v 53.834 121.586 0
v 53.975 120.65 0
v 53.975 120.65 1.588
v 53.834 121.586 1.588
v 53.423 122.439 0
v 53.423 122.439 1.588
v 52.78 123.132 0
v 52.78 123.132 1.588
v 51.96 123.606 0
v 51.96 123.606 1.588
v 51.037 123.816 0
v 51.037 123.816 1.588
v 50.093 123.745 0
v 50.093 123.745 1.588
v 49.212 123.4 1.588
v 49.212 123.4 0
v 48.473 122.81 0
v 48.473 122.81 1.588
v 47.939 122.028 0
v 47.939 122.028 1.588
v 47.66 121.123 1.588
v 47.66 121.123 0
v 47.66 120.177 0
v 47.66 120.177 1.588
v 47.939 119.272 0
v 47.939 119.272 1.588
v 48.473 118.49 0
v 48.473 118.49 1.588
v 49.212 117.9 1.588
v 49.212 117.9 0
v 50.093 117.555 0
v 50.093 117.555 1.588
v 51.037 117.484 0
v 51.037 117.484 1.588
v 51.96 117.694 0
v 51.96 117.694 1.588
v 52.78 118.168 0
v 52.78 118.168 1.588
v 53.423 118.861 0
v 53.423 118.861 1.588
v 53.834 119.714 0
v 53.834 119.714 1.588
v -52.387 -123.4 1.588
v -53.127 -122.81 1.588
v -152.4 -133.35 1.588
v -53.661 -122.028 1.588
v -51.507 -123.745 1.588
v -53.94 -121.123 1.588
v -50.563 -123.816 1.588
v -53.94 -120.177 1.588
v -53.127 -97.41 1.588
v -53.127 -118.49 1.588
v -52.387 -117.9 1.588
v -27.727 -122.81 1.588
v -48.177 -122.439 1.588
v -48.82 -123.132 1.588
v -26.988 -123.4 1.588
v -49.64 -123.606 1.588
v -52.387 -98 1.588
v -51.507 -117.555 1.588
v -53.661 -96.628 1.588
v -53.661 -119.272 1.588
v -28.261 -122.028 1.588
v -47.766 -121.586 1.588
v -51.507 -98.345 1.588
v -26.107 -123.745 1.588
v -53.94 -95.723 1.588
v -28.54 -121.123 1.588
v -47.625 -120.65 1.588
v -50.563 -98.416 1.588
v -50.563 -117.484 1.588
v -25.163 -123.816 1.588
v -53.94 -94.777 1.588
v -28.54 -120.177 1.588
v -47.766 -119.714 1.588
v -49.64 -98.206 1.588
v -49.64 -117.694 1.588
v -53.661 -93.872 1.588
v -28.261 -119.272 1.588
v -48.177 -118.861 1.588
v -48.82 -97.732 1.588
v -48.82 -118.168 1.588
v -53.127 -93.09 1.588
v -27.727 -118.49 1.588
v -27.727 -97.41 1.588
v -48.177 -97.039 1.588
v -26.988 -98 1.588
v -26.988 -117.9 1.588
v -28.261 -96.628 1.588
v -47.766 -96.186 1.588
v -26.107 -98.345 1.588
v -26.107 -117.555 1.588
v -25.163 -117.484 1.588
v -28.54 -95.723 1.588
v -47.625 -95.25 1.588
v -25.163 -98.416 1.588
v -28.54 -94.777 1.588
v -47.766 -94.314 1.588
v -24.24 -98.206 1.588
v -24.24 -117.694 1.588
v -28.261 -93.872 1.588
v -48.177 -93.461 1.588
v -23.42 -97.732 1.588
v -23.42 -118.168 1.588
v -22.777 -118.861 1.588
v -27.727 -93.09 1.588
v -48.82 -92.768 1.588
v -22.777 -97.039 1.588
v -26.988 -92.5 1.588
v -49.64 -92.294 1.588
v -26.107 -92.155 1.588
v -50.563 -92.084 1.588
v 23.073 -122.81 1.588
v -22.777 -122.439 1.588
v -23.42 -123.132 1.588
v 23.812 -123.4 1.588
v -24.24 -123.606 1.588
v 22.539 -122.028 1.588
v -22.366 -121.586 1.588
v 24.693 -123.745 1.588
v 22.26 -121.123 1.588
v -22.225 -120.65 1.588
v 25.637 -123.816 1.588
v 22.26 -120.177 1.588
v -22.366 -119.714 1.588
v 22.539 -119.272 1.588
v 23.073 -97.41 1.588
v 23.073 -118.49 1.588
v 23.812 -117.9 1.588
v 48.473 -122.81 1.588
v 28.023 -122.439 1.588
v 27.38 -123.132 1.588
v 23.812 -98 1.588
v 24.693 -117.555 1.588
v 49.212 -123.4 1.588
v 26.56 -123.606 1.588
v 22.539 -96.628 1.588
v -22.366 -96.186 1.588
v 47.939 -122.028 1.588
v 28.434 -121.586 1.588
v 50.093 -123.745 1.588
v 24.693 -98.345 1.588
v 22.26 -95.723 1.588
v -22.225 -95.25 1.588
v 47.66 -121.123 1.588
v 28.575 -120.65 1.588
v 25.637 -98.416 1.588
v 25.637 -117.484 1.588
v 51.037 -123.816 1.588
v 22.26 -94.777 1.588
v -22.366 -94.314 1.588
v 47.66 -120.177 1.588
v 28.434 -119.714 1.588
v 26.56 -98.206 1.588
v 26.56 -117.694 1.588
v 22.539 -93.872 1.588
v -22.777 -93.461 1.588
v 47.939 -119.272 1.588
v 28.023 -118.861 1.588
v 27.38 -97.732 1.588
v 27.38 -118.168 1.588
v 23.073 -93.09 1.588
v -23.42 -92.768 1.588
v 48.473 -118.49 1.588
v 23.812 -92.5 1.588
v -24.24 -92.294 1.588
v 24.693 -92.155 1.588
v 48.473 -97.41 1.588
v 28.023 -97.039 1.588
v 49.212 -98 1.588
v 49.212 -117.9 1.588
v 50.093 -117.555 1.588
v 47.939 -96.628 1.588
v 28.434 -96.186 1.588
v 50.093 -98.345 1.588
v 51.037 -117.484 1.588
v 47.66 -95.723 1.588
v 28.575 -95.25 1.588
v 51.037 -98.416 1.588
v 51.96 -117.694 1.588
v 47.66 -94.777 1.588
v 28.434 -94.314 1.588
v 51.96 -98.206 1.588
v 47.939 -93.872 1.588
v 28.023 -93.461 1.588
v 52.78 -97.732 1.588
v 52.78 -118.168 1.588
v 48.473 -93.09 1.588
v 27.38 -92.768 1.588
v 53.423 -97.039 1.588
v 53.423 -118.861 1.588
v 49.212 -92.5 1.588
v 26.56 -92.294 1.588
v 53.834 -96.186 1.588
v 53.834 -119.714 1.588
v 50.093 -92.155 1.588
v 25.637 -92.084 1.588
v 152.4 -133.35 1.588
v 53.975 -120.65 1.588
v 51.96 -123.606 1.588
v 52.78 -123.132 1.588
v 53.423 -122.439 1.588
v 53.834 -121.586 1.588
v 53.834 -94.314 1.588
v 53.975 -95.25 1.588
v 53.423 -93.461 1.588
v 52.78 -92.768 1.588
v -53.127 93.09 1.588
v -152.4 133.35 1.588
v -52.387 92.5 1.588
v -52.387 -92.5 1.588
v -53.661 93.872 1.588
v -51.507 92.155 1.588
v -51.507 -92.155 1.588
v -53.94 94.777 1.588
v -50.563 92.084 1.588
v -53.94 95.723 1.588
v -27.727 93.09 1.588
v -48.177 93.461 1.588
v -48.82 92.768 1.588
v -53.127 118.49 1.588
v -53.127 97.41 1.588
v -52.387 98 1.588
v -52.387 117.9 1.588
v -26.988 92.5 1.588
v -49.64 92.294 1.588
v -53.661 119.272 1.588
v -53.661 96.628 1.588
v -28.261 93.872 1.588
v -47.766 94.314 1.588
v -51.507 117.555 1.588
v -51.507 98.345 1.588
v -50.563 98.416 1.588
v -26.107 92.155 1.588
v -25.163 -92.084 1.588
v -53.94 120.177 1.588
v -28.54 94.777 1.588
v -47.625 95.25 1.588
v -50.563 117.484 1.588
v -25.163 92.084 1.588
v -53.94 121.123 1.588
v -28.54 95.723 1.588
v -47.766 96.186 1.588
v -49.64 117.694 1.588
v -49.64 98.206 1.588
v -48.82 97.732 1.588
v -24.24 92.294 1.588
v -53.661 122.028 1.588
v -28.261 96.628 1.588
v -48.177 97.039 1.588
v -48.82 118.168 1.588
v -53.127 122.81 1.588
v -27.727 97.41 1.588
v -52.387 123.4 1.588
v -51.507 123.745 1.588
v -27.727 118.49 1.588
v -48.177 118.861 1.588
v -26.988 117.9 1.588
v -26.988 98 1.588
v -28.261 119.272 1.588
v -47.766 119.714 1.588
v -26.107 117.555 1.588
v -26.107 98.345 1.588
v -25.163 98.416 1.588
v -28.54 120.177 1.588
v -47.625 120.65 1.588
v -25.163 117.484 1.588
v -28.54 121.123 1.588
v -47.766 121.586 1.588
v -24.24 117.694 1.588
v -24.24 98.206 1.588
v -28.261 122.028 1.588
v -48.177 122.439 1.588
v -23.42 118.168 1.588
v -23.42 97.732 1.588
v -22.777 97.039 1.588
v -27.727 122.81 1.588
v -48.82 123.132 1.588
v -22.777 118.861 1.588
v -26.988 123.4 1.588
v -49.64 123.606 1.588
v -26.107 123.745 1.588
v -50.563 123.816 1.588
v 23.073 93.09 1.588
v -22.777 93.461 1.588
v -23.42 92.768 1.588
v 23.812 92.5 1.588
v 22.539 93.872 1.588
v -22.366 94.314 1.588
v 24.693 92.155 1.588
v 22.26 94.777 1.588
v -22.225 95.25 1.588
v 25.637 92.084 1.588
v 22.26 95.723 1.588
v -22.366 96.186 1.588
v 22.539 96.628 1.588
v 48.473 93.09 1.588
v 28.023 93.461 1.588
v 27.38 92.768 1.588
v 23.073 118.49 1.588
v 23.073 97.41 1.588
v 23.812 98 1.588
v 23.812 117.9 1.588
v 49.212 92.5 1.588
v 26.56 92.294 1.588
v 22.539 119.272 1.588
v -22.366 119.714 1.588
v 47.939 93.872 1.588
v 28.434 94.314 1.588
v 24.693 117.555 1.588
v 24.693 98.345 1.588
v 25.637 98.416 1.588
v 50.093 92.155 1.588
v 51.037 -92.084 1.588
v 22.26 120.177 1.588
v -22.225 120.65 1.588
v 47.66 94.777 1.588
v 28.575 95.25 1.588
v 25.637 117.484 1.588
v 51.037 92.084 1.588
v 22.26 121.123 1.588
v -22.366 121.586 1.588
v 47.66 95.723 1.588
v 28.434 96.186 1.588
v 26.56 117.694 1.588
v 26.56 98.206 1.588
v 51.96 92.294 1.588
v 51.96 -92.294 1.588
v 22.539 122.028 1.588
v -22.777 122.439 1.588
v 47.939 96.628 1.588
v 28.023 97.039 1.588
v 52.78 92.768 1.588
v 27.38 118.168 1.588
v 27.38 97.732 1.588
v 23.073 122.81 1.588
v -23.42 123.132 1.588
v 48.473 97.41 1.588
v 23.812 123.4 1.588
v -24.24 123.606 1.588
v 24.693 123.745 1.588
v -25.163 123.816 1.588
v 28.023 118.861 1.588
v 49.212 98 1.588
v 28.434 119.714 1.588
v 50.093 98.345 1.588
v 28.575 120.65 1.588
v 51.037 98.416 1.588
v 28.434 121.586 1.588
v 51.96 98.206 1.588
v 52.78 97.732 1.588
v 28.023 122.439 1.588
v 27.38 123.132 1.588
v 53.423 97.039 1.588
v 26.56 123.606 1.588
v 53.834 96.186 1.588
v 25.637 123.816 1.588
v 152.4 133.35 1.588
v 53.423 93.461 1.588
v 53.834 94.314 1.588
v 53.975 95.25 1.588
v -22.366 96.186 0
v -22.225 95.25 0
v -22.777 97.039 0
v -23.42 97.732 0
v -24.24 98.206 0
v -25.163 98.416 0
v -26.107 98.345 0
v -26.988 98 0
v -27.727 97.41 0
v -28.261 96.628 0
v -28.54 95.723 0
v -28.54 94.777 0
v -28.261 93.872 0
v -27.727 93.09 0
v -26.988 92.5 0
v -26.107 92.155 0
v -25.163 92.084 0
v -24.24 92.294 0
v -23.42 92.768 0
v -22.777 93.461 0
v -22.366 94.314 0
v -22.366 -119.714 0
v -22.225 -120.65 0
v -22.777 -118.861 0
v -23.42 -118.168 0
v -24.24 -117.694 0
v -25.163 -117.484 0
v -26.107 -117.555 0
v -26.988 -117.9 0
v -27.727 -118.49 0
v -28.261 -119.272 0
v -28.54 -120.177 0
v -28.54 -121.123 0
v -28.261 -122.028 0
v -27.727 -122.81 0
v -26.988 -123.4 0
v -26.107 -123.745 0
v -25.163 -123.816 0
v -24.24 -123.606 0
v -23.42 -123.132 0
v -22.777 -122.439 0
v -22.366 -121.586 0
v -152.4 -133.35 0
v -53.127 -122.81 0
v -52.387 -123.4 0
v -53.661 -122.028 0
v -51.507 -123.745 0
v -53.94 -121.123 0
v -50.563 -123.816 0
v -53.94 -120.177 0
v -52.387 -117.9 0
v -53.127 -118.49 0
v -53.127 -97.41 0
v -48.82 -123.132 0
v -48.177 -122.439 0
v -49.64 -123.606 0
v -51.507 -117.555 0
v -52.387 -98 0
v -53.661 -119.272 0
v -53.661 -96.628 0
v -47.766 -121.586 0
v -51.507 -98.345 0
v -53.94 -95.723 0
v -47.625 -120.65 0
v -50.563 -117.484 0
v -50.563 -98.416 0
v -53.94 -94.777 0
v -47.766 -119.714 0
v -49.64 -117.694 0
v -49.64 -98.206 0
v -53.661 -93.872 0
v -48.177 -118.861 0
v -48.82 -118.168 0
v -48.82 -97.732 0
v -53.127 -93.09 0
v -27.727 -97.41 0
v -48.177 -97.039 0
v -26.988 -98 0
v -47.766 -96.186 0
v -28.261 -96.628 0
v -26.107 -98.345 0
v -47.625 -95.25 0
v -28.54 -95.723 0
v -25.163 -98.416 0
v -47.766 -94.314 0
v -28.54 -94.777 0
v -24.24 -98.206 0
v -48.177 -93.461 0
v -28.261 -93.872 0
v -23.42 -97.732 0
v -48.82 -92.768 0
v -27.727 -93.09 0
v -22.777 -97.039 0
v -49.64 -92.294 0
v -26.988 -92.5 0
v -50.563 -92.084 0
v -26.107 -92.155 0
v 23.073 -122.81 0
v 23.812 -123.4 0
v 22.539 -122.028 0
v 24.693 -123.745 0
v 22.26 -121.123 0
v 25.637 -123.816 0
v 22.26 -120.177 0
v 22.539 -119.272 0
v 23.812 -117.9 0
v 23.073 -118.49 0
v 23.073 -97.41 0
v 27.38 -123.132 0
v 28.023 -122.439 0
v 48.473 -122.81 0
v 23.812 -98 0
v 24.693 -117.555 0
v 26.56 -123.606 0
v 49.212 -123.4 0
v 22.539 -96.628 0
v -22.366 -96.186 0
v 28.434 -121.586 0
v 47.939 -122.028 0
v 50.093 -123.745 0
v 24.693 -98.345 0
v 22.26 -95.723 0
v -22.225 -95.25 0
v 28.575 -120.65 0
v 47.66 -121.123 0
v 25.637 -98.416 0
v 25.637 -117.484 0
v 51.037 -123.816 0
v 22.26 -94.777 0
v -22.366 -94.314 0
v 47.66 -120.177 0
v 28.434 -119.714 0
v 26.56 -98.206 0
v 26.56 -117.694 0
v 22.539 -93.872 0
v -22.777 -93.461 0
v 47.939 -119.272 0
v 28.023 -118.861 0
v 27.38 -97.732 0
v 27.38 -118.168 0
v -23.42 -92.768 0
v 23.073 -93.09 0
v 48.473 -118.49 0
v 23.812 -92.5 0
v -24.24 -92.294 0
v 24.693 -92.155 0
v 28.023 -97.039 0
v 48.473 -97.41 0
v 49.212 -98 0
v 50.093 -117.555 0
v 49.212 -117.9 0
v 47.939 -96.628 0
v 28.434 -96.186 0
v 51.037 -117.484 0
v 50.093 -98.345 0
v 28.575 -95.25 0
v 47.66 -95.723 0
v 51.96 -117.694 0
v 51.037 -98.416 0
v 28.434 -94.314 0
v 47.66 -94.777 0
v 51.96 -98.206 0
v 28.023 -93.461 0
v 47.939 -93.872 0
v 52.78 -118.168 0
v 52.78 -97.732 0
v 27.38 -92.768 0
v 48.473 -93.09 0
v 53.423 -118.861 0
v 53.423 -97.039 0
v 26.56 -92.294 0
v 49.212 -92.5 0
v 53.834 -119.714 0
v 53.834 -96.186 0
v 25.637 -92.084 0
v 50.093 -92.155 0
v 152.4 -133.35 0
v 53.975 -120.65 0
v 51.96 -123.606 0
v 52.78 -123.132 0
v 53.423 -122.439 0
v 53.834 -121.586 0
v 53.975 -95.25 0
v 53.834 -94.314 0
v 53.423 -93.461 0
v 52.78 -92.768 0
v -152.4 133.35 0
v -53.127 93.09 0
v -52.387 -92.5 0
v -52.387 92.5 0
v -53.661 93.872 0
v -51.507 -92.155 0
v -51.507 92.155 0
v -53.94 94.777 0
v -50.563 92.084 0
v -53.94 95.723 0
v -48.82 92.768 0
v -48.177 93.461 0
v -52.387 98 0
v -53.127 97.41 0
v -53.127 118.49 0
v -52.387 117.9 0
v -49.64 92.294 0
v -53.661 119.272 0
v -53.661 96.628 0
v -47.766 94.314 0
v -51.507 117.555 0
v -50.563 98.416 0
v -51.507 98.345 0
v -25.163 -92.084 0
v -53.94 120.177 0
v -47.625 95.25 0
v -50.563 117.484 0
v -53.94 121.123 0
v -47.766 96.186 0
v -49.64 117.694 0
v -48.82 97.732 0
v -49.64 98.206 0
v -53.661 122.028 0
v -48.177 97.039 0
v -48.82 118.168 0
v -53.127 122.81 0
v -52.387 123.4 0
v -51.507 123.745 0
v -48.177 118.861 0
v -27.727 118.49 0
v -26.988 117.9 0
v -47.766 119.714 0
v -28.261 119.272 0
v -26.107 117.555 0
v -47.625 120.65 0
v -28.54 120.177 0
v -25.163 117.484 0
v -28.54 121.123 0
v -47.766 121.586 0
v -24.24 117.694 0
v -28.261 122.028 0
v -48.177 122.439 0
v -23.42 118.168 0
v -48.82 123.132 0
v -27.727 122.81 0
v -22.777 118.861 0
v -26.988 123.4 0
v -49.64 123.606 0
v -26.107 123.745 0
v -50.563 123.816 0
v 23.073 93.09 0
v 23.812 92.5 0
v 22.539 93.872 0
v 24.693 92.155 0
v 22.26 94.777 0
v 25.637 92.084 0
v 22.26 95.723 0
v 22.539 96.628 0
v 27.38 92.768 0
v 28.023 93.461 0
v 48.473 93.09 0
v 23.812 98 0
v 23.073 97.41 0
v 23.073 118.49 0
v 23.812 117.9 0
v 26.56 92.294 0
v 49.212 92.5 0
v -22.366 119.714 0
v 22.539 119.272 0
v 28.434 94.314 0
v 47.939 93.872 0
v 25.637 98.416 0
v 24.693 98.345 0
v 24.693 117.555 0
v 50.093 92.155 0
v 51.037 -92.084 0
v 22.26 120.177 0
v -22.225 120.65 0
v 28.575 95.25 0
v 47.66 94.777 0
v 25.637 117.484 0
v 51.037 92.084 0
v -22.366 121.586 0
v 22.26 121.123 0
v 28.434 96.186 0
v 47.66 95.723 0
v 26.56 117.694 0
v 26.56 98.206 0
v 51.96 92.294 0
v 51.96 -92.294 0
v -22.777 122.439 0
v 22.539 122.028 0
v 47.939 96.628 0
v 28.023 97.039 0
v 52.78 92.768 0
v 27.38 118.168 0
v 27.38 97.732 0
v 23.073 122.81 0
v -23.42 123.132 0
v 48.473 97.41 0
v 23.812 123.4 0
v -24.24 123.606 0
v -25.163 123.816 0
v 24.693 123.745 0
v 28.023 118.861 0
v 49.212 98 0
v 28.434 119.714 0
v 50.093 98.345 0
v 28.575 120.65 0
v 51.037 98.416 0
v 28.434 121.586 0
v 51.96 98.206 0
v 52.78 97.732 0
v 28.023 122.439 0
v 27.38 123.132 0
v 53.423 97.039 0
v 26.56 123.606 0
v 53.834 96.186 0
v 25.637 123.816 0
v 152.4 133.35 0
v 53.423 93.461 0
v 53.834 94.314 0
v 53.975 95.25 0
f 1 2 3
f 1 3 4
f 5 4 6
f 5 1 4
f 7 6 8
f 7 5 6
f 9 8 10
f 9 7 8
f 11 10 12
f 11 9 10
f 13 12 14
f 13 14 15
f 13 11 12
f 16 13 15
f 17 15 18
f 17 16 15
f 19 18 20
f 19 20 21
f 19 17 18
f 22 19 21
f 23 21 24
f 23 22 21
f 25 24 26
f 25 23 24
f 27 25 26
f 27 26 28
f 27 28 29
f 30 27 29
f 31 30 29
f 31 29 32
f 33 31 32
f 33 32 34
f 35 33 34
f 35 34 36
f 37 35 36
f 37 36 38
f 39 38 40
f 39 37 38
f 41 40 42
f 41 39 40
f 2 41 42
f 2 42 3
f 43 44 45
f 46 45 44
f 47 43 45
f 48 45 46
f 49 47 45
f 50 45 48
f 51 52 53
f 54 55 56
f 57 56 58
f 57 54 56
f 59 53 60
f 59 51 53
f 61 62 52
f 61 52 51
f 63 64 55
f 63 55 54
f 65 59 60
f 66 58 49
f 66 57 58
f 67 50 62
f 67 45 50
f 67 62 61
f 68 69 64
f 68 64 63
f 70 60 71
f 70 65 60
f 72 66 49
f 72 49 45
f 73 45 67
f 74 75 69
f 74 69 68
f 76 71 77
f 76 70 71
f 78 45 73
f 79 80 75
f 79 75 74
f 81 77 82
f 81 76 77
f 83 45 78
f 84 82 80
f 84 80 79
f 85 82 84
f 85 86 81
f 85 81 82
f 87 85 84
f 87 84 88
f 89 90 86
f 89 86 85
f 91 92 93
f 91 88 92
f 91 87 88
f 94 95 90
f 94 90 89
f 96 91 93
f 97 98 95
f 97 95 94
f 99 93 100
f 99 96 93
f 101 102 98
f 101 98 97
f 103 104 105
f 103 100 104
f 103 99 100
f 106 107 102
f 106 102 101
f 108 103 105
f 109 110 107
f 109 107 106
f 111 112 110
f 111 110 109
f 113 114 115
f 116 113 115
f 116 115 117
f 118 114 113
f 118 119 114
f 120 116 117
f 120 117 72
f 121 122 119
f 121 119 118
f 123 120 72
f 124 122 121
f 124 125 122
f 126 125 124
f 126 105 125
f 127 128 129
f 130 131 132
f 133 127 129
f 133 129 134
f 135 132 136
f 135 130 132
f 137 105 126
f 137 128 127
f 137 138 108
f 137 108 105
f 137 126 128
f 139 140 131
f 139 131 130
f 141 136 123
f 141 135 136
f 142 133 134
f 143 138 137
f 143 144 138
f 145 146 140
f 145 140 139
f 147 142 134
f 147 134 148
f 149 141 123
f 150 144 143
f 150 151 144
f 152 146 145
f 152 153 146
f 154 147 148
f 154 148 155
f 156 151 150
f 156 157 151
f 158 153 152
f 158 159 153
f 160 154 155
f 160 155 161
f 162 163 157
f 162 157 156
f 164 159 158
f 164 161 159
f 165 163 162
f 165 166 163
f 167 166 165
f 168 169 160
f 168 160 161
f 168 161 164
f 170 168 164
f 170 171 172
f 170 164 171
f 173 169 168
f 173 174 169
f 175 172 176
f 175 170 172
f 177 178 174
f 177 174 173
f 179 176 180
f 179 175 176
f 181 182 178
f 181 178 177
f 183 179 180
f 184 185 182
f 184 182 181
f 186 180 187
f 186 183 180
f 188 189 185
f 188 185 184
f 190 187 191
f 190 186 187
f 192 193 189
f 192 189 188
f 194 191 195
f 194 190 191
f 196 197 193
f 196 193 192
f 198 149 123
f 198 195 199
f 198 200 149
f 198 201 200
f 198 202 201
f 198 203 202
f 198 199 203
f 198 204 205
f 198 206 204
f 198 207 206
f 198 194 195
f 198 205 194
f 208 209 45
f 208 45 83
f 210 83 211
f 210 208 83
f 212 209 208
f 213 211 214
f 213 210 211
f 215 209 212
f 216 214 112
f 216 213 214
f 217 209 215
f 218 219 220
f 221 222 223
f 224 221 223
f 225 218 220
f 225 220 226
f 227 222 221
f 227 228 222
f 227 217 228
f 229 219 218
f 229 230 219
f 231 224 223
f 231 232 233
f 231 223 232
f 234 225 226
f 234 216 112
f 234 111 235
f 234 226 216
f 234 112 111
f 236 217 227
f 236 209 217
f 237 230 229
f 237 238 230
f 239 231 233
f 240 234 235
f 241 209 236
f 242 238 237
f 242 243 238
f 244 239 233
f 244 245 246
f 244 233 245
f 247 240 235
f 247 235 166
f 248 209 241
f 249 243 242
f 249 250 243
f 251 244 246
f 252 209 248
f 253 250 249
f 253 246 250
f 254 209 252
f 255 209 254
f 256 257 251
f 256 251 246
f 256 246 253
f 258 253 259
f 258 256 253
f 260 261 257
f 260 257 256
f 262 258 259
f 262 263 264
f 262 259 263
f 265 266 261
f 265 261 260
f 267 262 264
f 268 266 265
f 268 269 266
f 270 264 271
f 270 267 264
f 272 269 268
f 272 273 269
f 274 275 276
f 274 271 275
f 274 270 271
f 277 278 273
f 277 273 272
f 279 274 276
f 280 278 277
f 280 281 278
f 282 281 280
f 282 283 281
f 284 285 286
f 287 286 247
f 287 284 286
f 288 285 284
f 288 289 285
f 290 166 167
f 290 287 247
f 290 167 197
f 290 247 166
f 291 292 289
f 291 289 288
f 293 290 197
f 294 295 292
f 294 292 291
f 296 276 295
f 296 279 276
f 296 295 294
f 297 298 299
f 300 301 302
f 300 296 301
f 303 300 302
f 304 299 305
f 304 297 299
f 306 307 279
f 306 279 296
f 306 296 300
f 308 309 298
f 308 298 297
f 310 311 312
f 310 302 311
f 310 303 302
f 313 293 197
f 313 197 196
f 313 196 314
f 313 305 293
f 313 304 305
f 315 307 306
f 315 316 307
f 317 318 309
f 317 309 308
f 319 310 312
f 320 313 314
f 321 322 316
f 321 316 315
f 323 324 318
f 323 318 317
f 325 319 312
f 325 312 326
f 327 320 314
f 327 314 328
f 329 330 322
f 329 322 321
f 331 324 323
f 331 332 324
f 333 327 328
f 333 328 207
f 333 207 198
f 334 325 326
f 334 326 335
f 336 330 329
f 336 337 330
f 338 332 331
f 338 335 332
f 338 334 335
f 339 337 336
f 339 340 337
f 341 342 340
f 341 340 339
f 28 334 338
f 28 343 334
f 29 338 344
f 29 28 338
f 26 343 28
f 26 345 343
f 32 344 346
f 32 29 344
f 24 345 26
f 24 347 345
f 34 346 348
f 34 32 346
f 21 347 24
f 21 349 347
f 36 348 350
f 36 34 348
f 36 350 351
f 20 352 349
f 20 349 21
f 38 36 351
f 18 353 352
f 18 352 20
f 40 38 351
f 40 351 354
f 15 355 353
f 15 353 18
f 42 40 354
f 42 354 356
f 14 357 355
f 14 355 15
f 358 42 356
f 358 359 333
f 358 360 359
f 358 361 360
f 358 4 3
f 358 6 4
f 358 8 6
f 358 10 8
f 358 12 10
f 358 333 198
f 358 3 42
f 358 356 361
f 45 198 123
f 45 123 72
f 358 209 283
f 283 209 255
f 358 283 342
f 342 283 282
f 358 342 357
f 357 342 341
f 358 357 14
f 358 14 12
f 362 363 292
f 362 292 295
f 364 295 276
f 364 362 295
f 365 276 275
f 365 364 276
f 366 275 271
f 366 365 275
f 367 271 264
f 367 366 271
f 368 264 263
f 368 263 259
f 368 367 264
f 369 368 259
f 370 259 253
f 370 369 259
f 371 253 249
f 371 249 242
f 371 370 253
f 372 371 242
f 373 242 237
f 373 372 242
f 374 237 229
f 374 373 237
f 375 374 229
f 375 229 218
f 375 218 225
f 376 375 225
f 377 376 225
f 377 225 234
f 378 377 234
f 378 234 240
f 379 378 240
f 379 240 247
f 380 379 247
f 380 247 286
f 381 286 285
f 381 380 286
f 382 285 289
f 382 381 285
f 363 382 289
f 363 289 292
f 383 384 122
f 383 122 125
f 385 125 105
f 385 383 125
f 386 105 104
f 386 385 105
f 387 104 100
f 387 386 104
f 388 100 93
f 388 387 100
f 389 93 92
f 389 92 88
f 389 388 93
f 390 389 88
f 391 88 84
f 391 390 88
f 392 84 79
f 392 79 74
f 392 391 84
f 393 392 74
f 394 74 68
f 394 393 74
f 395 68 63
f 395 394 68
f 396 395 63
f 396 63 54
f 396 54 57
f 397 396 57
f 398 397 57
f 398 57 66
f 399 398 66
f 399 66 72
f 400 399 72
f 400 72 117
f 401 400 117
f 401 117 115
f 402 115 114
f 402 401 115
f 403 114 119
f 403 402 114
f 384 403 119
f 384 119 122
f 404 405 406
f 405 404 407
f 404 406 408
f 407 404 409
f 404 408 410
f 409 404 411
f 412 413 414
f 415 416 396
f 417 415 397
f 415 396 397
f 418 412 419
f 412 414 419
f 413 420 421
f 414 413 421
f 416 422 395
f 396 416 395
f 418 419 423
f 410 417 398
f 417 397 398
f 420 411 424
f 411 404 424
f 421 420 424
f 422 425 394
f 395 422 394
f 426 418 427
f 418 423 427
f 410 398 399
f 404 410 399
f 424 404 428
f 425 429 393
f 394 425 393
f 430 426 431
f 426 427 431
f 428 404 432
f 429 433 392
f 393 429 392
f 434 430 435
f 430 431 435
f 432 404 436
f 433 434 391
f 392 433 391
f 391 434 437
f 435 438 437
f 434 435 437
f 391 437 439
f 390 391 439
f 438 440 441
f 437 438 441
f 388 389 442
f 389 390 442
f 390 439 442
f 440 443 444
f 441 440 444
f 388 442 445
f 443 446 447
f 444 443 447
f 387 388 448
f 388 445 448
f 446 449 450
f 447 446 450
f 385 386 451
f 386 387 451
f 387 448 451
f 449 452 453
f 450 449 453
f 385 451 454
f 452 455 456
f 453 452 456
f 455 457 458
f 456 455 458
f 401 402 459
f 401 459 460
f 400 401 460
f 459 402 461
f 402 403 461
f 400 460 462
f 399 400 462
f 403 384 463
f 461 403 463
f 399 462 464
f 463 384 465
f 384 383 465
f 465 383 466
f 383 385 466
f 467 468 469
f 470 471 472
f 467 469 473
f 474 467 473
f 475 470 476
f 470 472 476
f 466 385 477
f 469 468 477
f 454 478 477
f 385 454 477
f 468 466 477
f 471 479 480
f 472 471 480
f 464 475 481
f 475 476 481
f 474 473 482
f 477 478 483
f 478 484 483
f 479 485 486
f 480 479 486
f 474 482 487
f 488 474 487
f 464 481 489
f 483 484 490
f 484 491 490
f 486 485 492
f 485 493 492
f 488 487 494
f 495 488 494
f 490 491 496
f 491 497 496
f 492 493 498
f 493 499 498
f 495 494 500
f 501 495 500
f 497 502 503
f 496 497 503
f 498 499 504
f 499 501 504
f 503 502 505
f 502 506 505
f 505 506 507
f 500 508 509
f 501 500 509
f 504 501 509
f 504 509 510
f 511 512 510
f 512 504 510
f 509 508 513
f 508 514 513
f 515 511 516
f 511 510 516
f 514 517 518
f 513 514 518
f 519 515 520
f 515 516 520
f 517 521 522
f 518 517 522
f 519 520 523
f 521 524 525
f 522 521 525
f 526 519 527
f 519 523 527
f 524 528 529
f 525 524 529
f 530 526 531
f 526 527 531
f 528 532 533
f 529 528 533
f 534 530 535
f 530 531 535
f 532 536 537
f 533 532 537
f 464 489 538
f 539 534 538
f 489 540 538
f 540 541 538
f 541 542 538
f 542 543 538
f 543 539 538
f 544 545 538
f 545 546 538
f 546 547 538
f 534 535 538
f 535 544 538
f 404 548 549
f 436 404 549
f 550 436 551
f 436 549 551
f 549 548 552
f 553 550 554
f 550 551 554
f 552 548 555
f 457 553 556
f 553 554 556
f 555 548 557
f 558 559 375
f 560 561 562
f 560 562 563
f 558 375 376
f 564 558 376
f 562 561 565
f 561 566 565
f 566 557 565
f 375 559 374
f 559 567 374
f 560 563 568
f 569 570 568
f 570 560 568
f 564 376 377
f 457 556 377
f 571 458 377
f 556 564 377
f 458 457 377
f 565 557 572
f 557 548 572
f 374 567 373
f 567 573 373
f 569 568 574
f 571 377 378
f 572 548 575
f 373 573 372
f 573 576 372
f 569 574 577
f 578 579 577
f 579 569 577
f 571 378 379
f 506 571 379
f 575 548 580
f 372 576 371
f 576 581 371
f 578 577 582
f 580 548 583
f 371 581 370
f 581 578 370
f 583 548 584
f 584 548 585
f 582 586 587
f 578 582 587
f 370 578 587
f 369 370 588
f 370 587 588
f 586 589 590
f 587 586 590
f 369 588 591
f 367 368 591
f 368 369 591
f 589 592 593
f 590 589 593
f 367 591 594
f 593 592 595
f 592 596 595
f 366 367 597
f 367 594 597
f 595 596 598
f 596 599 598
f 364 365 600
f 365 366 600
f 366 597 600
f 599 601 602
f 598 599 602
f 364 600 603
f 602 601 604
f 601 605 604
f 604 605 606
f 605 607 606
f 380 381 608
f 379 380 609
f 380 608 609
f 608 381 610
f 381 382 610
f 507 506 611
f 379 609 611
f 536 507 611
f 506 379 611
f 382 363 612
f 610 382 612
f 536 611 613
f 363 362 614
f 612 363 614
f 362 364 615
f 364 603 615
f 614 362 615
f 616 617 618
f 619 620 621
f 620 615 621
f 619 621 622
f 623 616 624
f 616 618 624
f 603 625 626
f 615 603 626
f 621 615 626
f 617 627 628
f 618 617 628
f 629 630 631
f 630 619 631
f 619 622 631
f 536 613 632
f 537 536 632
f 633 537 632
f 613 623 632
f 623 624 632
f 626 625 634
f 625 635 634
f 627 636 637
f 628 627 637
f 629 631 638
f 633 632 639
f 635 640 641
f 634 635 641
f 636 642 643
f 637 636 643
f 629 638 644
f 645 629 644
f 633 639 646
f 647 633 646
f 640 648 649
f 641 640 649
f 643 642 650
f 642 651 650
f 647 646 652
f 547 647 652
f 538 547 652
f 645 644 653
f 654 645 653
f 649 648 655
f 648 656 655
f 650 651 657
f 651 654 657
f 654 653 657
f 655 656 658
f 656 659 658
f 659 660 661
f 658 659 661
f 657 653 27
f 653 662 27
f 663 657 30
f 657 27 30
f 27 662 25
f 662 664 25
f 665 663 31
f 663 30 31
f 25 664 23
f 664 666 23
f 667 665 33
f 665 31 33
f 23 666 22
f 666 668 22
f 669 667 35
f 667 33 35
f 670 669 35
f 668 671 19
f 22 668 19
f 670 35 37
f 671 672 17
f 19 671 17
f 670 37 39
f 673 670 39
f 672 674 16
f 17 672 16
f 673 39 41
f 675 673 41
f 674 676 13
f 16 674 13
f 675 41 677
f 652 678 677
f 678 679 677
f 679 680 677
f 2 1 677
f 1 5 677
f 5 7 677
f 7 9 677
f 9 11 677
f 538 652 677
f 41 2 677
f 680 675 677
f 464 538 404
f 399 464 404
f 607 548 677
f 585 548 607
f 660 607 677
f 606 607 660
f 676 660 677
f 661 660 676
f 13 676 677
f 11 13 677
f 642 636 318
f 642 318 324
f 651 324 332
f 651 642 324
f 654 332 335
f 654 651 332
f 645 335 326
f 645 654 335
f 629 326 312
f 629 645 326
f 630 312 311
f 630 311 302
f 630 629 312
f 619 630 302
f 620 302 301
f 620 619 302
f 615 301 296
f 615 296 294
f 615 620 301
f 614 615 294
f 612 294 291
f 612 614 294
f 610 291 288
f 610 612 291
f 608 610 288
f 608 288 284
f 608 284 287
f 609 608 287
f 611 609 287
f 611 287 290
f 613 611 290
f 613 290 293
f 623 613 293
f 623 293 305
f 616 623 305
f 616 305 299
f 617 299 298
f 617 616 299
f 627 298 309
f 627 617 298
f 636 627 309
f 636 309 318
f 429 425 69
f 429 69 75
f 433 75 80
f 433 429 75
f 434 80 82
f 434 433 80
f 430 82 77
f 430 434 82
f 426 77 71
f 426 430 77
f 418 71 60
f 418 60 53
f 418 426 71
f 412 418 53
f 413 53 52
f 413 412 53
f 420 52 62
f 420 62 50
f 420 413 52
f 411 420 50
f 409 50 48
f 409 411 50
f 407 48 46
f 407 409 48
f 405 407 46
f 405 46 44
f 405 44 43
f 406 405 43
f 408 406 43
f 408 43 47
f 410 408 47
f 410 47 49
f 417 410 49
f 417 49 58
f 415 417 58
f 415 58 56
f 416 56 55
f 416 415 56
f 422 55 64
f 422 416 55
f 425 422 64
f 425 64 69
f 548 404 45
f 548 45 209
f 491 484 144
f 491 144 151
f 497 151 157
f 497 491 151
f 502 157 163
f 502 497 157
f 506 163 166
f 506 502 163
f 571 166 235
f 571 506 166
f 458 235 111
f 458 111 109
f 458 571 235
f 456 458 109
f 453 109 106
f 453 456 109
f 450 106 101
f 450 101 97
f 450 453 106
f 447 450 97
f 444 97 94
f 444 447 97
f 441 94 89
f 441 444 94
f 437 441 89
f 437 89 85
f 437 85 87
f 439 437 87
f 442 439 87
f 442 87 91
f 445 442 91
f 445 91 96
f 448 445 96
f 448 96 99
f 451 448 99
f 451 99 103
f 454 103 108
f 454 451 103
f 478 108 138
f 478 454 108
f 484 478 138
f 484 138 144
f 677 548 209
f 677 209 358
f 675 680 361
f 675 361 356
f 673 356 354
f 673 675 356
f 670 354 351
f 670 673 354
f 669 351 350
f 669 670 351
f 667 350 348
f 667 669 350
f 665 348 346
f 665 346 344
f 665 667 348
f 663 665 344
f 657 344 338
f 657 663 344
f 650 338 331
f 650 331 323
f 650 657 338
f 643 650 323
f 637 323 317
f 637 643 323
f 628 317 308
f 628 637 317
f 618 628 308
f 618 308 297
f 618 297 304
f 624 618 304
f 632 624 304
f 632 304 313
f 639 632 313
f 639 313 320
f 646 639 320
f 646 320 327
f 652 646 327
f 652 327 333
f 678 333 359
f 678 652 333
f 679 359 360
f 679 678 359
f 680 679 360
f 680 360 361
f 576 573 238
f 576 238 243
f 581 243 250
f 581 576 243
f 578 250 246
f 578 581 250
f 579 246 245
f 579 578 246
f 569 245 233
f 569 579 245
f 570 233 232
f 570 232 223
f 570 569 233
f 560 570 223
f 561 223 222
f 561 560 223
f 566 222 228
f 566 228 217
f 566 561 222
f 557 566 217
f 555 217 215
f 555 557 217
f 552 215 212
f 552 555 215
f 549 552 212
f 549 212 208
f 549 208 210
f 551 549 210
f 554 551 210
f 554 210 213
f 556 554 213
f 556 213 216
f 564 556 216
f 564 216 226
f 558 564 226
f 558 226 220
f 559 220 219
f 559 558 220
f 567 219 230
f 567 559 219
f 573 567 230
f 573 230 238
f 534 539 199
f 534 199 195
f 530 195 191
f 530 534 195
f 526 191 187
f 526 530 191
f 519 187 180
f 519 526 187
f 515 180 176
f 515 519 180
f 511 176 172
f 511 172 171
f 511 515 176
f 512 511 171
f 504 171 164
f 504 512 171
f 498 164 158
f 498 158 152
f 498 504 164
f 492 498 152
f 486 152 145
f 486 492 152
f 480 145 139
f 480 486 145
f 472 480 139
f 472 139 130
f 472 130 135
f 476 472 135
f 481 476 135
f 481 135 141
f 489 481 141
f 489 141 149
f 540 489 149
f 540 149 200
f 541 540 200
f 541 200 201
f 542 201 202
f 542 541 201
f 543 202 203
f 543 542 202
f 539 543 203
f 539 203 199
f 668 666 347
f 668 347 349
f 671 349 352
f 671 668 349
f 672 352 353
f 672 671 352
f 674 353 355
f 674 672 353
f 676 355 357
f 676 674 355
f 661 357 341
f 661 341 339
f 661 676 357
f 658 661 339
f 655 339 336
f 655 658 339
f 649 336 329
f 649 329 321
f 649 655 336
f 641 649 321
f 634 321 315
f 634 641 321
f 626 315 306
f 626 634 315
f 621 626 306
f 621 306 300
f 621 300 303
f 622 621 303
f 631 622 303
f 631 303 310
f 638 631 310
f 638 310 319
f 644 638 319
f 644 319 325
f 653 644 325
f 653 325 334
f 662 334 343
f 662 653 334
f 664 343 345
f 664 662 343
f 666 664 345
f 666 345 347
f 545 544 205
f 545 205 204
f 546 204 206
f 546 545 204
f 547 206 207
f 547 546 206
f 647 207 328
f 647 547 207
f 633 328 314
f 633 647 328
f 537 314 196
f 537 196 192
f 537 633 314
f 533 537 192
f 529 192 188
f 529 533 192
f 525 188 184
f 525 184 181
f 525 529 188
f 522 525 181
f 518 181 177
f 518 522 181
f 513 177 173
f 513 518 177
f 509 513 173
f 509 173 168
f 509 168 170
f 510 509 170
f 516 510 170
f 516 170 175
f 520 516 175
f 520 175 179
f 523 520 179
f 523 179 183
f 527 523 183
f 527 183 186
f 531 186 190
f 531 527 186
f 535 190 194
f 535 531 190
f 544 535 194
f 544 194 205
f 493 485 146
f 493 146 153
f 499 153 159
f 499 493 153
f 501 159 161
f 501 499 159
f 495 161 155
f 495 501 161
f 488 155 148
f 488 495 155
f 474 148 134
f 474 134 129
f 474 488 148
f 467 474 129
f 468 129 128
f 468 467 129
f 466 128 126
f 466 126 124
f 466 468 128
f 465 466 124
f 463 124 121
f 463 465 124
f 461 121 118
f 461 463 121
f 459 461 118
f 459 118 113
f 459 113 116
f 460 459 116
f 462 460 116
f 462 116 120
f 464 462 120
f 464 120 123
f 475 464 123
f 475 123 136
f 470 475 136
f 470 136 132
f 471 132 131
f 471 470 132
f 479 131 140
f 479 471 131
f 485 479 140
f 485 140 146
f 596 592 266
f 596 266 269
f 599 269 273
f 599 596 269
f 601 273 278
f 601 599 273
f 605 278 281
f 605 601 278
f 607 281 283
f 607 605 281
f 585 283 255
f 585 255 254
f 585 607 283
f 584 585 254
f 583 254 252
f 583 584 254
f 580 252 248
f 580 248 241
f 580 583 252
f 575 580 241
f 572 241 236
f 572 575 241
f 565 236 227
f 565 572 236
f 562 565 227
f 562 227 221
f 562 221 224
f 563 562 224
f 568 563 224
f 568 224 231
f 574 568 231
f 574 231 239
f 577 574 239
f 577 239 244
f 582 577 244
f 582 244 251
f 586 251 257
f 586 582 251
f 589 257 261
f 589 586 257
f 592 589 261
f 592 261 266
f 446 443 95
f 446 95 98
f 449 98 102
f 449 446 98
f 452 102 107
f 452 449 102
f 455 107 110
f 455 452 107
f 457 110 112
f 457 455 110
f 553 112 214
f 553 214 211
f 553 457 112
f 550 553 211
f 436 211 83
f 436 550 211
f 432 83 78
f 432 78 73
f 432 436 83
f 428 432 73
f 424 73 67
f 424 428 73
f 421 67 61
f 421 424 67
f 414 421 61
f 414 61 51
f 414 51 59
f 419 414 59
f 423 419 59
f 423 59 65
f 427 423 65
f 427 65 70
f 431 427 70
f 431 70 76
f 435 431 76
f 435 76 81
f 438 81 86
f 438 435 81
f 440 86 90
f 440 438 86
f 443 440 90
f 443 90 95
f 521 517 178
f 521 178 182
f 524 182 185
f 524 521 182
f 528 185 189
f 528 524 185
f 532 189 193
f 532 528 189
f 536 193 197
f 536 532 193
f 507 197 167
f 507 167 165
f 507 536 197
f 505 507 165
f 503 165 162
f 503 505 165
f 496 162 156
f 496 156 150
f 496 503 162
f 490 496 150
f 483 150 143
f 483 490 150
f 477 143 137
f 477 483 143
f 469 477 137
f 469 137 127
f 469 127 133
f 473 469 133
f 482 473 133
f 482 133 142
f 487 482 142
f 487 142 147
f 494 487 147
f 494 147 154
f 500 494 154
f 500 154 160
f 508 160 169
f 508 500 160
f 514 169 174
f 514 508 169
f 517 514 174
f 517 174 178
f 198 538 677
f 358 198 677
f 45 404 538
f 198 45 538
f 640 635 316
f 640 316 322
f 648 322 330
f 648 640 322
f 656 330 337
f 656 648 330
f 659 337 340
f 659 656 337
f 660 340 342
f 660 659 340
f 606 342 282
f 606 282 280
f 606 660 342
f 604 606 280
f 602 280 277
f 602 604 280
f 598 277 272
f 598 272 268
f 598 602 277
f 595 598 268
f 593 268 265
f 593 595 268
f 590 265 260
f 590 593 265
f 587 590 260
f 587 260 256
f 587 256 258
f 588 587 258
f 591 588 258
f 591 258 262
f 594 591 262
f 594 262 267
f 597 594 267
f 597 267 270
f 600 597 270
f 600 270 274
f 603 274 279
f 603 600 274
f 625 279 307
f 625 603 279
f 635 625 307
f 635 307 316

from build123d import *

# Parameters (mm, degrees)
F0_W     = 304.8
F0_H     = 266.7
F0_R     = 3.175
F1_DEPTH = 1.5875


with BuildPart() as f1:
    # F0 (on Top) → F1 (new body)
    with BuildSketch(Plane.XY):
        Rectangle(F0_W, F0_H)
        with Locations((-50.8, -120.65)):
            Circle(F0_R, mode=Mode.SUBTRACT)
        with Locations((-25.4, -120.65)):
            Circle(F0_R, mode=Mode.SUBTRACT)
        with Locations((-50.8, -95.25)):
            Circle(F0_R, mode=Mode.SUBTRACT)
        with Locations((-25.4, -95.25)):
            Circle(F0_R, mode=Mode.SUBTRACT)
        with Locations((25.4, -120.65)):
            Circle(F0_R, mode=Mode.SUBTRACT)
        with Locations((50.8, -120.65)):
            Circle(F0_R, mode=Mode.SUBTRACT)
        with Locations((25.4, -95.25)):
            Circle(F0_R, mode=Mode.SUBTRACT)
        with Locations((50.8, -95.25)):
            Circle(F0_R, mode=Mode.SUBTRACT)
        with Locations((-50.8, 95.25)):
            Circle(F0_R, mode=Mode.SUBTRACT)
        with Locations((-25.4, 95.25)):
            Circle(F0_R, mode=Mode.SUBTRACT)
        with Locations((-50.8, 120.65)):
            Circle(F0_R, mode=Mode.SUBTRACT)
        with Locations((-25.4, 120.65)):
            Circle(F0_R, mode=Mode.SUBTRACT)
        with Locations((25.4, 95.25)):
            Circle(F0_R, mode=Mode.SUBTRACT)
        with Locations((50.8, 95.25)):
            Circle(F0_R, mode=Mode.SUBTRACT)
        with Locations((25.4, 120.65)):
            Circle(F0_R, mode=Mode.SUBTRACT)
        with Locations((50.8, 120.65)):
            Circle(F0_R, mode=Mode.SUBTRACT)
    extrude(amount=F1_DEPTH)


solid = f1.part
